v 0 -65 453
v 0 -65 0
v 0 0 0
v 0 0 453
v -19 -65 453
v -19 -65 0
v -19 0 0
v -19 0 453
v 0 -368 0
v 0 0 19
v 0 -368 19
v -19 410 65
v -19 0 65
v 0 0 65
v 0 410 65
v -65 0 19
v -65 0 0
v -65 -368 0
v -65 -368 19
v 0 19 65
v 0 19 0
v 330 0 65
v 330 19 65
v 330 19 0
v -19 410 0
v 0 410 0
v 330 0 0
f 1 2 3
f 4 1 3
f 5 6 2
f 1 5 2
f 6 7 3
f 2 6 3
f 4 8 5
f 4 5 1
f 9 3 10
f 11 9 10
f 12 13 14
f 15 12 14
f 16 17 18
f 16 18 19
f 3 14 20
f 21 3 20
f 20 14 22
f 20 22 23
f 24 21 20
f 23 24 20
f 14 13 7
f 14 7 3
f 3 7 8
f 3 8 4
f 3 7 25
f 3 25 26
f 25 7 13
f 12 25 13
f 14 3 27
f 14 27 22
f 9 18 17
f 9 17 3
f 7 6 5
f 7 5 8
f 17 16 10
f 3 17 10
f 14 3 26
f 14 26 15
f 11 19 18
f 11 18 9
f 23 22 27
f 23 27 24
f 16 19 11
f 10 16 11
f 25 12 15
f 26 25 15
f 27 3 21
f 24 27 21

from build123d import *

# Parameters (mm, degrees)
F0_W     = 19
F0_H     = 65
F1_DEPTH = 330
F3_W     = 19
F3_H     = 65
F4_DEPTH = 410
F2_W     = 19
F2_H     = 65
F5_DEPTH = 453
F6_W     = 65
F6_H     = 19
F7_DEPTH = 368


# Not quite as in the source:
# - a feature names something its author has since deleted; it is built from what else it names


with BuildPart() as f1:
    # F0 (on Right) → F1 (new body)
    with BuildSketch(Plane.YZ):
        with Locations((9.5, 32.5)):
            Rectangle(F0_W, F0_H)
    extrude(amount=F1_DEPTH)


with BuildPart() as f4:
    # F3 (on Front) → F4 (new body)
    with BuildSketch(Plane.XZ):
        with Locations((-9.5, 32.5)):
            Rectangle(F3_W, F3_H)
    extrude(amount=-F4_DEPTH)


with BuildPart() as f5:
    # F2 (on Top) → F5 (new body)
    with BuildSketch(Plane.XY):
        with Locations((-9.5, -32.5)):
            Rectangle(F2_W, F2_H)
    extrude(amount=F5_DEPTH)


with BuildPart() as f7:
    # F6 (on Front) → F7 (new body)
    with BuildSketch(Plane.XZ):
        with Locations((-32.5, 9.5)):
            Rectangle(F6_W, F6_H)
    extrude(amount=F7_DEPTH)


solid = Compound([f1.part, f4.part, f5.part, f7.part])
